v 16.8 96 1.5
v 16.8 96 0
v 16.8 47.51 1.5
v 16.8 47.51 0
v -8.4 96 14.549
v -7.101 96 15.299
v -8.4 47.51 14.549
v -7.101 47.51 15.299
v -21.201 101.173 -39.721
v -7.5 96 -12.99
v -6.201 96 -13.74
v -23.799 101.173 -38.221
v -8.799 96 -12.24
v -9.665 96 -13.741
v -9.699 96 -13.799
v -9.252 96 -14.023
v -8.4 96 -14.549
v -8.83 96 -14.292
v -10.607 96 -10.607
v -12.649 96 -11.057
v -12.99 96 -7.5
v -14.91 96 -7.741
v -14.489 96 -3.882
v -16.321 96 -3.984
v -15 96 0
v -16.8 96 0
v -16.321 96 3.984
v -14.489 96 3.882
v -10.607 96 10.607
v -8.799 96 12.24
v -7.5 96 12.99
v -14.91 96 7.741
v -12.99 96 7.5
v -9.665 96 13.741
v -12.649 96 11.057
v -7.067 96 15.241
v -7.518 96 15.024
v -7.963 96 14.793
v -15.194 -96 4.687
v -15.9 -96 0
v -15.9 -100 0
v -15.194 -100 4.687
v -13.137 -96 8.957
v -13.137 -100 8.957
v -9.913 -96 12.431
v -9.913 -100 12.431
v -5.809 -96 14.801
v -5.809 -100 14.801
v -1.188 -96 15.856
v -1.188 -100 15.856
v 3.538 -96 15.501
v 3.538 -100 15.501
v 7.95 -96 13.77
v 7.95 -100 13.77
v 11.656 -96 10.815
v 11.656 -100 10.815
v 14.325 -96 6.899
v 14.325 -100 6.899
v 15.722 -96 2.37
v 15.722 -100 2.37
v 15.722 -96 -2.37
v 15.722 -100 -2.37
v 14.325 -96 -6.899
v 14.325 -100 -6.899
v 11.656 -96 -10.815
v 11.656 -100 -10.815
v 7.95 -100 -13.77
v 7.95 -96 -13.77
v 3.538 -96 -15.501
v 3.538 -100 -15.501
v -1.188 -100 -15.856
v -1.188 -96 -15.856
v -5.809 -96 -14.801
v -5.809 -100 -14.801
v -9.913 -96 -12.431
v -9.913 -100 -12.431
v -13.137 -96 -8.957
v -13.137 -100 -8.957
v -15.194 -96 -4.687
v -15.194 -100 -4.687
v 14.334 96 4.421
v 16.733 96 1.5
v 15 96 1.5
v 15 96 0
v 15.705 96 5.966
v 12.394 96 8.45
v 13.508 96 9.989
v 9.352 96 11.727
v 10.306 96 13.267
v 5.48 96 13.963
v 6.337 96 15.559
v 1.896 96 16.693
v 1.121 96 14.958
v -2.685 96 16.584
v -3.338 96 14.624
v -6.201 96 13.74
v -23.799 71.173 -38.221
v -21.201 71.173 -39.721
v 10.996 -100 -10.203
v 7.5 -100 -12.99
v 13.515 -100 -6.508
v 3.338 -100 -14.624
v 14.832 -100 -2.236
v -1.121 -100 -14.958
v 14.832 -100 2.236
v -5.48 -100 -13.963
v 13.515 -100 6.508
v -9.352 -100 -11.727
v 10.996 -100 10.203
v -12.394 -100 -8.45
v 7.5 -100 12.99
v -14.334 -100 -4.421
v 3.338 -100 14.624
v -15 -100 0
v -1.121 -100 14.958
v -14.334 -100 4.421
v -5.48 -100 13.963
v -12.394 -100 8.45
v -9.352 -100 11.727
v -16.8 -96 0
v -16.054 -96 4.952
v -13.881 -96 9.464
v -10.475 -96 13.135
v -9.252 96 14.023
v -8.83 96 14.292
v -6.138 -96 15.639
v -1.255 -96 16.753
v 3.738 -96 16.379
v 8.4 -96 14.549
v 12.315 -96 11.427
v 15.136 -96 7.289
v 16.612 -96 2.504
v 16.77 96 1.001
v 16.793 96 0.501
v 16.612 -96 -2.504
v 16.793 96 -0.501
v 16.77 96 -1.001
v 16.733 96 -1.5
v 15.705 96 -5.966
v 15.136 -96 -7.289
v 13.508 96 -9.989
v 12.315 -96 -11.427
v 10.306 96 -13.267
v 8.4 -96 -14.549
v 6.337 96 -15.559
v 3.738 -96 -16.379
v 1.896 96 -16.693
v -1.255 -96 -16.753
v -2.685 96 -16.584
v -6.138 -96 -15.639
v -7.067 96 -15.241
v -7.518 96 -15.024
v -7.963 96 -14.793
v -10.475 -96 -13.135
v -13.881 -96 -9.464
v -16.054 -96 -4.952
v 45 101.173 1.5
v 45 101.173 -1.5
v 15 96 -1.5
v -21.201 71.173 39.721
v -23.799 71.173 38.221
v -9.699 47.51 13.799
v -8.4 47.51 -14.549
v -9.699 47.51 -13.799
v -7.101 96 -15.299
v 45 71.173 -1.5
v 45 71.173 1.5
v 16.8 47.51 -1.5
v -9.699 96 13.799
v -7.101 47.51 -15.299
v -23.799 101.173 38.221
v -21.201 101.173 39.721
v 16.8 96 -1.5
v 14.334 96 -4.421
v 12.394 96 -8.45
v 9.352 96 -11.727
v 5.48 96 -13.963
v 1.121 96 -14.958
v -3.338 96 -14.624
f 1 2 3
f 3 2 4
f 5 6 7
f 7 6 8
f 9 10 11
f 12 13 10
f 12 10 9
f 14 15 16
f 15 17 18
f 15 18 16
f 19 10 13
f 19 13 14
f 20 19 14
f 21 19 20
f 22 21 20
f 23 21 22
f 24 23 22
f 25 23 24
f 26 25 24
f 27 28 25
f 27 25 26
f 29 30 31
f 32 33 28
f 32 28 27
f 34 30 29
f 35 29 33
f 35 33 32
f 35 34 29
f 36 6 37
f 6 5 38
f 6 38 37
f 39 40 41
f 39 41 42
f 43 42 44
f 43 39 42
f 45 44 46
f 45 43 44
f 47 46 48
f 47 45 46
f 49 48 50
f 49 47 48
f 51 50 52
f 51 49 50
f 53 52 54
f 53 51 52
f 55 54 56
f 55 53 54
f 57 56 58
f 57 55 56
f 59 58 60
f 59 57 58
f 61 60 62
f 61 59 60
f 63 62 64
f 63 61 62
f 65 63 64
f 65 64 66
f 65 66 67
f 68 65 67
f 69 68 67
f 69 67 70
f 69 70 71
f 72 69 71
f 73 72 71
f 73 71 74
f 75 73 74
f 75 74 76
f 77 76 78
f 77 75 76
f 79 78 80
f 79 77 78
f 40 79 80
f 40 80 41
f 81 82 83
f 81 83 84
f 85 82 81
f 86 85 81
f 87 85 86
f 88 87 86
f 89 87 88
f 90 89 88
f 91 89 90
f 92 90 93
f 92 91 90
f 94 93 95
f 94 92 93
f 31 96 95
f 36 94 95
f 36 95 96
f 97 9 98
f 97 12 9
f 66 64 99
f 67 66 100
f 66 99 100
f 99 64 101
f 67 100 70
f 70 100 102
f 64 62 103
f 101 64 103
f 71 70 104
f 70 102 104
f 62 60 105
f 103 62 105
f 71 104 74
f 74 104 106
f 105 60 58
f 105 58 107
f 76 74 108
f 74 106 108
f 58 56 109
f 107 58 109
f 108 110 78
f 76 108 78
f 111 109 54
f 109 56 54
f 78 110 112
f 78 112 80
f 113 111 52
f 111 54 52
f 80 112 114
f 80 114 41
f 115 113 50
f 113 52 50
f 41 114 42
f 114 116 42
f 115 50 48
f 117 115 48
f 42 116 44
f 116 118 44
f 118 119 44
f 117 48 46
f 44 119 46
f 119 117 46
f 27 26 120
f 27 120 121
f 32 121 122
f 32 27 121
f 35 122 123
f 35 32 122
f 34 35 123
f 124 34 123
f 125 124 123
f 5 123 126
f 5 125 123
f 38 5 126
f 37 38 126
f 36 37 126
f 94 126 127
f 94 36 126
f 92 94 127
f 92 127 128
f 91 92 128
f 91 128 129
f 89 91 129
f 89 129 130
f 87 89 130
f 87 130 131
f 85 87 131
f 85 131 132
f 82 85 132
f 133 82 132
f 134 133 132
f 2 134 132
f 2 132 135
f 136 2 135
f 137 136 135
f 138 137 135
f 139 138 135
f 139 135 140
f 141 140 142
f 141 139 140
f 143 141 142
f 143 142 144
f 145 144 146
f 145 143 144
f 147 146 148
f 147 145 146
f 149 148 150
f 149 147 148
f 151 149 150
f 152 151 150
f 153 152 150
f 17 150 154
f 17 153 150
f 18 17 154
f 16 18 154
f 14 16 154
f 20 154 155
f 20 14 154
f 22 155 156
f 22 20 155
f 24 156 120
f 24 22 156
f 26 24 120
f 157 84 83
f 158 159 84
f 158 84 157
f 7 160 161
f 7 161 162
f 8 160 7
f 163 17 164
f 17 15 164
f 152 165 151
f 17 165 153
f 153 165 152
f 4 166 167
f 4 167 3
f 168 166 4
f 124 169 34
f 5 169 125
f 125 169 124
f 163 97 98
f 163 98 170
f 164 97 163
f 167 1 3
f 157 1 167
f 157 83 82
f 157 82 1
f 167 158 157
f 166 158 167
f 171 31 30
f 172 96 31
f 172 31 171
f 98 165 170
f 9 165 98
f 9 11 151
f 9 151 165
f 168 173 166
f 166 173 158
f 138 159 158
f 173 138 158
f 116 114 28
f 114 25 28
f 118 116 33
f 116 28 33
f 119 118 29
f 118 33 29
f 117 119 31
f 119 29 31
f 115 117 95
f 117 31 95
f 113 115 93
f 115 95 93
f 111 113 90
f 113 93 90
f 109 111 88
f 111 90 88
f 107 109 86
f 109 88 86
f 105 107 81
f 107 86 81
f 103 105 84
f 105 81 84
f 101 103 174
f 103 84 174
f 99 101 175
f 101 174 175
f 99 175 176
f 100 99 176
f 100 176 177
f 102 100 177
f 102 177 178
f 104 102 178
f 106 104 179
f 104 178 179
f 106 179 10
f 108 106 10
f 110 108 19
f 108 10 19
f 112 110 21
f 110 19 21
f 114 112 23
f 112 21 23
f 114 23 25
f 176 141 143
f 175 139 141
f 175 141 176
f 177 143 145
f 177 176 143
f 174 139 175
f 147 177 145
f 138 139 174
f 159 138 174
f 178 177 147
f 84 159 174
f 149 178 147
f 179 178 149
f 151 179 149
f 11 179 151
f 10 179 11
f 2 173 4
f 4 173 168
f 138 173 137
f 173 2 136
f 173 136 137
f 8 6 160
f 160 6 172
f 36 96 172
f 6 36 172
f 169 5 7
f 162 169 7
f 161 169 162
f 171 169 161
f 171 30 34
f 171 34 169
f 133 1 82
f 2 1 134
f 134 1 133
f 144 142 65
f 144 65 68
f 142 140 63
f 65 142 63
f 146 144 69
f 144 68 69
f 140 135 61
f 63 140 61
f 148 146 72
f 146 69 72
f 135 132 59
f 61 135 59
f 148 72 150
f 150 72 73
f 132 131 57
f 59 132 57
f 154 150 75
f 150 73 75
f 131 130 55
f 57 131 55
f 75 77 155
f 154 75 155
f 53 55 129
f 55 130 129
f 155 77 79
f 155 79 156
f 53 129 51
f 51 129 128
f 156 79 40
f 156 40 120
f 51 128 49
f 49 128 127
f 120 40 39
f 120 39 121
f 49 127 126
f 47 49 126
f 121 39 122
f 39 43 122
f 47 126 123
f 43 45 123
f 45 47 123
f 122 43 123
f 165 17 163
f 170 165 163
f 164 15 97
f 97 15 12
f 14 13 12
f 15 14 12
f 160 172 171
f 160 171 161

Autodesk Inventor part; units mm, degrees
ref_plane "YZ Plane" through (0, 0, 0) normal (1, 0, 0) x (0, 1, 0)
ref_plane "XZ Plane" through (0, 0, 0) normal (0, 1, 0) x (-1, 0, 0)
ref_plane "XY Plane" through (0, 0, 0) normal (0, 0, 1) x (1, 0, 0)
sketch "Sketch1" plane through (0, 0, 0) normal (0, 1, 0) x (-1, 0, 0)
  circle A0 centre (0, 0) radius 15
  circle A1 centre (0, 0) radius 15.9
  circle A2 centre (0, 0) radius 16.8
  dimension "d0" = 30
  dimension "d1" = 31.8
  dimension "d2" = 33.6
extrude "Extrusion1" add sketch "Sketch1" along normal blind 96 and the other way blind 100 contours A1
extrude "Extrusion2" add sketch "Sketch1" along normal blind 96 and the other way blind 96 contours A2
sketch "Sketch4" plane through (0, 0, 0) normal (0, 0, 1) x (1, 0, 0)
  line L0 (45, 99.9302) -> (45, 71.173)
  line L1 (45, 71.173) -> (15, 46)
  line L2 (15, 46) -> (15, 96)
  line L3 (15, 96) -> (45, 101.173)
  line L4 (45, 101.173) -> (45, 99.9302)
  line L5 (-15, 96) -> (15, 96) projected
  line L6 (16.8, 96) -> (-16.8, 96) projected
  line L7 (-15, 96) -> (15, 96) projected
  line L8 (15.9, -100) -> (15, -100) projected
  line L9 (15, -100) -> (15, 96) projected
  line L10 (15, 96) -> (16.8, 96) projected
  line L11 (16.8, 96) -> (16.8, -96) projected
  line L12 (16.8, -96) -> (15.9, -96) projected
  line L13 (-15, -100) -> (-15.9, -100) projected
  line L14 (-16.8, -96) -> (-16.8, 96) projected
  line L15 (-16.8, 96) -> (-15, 96) projected
  line L16 (-15, 96) -> (-15, -100) projected
  line L17 (-15.9, -96) -> (-16.8, -96) projected
  line L18 (15.9, -96) -> (15.9, -100) projected
  line L19 (-15.9, -100) -> (-15.9, -96) projected
  point P0 (0, 0)
  point P1 (16.8, 47.5104)
  dimension "d18" = 50
  dimension "d21" = 50
  dimension "d24" = 30
  dimension "d25" = 30
extrude "Extrusion4" add sketch "Sketch4" along normal mid plane 3 contours L0 L1 L11 L6 L3 L4
pattern_circular "Circular Pattern2" count 3 over 360 about axis through (0, -10, 0) along (0, 1, 0) of "Extrusion4"
properties part number "tail" material "ABS Plastic"
